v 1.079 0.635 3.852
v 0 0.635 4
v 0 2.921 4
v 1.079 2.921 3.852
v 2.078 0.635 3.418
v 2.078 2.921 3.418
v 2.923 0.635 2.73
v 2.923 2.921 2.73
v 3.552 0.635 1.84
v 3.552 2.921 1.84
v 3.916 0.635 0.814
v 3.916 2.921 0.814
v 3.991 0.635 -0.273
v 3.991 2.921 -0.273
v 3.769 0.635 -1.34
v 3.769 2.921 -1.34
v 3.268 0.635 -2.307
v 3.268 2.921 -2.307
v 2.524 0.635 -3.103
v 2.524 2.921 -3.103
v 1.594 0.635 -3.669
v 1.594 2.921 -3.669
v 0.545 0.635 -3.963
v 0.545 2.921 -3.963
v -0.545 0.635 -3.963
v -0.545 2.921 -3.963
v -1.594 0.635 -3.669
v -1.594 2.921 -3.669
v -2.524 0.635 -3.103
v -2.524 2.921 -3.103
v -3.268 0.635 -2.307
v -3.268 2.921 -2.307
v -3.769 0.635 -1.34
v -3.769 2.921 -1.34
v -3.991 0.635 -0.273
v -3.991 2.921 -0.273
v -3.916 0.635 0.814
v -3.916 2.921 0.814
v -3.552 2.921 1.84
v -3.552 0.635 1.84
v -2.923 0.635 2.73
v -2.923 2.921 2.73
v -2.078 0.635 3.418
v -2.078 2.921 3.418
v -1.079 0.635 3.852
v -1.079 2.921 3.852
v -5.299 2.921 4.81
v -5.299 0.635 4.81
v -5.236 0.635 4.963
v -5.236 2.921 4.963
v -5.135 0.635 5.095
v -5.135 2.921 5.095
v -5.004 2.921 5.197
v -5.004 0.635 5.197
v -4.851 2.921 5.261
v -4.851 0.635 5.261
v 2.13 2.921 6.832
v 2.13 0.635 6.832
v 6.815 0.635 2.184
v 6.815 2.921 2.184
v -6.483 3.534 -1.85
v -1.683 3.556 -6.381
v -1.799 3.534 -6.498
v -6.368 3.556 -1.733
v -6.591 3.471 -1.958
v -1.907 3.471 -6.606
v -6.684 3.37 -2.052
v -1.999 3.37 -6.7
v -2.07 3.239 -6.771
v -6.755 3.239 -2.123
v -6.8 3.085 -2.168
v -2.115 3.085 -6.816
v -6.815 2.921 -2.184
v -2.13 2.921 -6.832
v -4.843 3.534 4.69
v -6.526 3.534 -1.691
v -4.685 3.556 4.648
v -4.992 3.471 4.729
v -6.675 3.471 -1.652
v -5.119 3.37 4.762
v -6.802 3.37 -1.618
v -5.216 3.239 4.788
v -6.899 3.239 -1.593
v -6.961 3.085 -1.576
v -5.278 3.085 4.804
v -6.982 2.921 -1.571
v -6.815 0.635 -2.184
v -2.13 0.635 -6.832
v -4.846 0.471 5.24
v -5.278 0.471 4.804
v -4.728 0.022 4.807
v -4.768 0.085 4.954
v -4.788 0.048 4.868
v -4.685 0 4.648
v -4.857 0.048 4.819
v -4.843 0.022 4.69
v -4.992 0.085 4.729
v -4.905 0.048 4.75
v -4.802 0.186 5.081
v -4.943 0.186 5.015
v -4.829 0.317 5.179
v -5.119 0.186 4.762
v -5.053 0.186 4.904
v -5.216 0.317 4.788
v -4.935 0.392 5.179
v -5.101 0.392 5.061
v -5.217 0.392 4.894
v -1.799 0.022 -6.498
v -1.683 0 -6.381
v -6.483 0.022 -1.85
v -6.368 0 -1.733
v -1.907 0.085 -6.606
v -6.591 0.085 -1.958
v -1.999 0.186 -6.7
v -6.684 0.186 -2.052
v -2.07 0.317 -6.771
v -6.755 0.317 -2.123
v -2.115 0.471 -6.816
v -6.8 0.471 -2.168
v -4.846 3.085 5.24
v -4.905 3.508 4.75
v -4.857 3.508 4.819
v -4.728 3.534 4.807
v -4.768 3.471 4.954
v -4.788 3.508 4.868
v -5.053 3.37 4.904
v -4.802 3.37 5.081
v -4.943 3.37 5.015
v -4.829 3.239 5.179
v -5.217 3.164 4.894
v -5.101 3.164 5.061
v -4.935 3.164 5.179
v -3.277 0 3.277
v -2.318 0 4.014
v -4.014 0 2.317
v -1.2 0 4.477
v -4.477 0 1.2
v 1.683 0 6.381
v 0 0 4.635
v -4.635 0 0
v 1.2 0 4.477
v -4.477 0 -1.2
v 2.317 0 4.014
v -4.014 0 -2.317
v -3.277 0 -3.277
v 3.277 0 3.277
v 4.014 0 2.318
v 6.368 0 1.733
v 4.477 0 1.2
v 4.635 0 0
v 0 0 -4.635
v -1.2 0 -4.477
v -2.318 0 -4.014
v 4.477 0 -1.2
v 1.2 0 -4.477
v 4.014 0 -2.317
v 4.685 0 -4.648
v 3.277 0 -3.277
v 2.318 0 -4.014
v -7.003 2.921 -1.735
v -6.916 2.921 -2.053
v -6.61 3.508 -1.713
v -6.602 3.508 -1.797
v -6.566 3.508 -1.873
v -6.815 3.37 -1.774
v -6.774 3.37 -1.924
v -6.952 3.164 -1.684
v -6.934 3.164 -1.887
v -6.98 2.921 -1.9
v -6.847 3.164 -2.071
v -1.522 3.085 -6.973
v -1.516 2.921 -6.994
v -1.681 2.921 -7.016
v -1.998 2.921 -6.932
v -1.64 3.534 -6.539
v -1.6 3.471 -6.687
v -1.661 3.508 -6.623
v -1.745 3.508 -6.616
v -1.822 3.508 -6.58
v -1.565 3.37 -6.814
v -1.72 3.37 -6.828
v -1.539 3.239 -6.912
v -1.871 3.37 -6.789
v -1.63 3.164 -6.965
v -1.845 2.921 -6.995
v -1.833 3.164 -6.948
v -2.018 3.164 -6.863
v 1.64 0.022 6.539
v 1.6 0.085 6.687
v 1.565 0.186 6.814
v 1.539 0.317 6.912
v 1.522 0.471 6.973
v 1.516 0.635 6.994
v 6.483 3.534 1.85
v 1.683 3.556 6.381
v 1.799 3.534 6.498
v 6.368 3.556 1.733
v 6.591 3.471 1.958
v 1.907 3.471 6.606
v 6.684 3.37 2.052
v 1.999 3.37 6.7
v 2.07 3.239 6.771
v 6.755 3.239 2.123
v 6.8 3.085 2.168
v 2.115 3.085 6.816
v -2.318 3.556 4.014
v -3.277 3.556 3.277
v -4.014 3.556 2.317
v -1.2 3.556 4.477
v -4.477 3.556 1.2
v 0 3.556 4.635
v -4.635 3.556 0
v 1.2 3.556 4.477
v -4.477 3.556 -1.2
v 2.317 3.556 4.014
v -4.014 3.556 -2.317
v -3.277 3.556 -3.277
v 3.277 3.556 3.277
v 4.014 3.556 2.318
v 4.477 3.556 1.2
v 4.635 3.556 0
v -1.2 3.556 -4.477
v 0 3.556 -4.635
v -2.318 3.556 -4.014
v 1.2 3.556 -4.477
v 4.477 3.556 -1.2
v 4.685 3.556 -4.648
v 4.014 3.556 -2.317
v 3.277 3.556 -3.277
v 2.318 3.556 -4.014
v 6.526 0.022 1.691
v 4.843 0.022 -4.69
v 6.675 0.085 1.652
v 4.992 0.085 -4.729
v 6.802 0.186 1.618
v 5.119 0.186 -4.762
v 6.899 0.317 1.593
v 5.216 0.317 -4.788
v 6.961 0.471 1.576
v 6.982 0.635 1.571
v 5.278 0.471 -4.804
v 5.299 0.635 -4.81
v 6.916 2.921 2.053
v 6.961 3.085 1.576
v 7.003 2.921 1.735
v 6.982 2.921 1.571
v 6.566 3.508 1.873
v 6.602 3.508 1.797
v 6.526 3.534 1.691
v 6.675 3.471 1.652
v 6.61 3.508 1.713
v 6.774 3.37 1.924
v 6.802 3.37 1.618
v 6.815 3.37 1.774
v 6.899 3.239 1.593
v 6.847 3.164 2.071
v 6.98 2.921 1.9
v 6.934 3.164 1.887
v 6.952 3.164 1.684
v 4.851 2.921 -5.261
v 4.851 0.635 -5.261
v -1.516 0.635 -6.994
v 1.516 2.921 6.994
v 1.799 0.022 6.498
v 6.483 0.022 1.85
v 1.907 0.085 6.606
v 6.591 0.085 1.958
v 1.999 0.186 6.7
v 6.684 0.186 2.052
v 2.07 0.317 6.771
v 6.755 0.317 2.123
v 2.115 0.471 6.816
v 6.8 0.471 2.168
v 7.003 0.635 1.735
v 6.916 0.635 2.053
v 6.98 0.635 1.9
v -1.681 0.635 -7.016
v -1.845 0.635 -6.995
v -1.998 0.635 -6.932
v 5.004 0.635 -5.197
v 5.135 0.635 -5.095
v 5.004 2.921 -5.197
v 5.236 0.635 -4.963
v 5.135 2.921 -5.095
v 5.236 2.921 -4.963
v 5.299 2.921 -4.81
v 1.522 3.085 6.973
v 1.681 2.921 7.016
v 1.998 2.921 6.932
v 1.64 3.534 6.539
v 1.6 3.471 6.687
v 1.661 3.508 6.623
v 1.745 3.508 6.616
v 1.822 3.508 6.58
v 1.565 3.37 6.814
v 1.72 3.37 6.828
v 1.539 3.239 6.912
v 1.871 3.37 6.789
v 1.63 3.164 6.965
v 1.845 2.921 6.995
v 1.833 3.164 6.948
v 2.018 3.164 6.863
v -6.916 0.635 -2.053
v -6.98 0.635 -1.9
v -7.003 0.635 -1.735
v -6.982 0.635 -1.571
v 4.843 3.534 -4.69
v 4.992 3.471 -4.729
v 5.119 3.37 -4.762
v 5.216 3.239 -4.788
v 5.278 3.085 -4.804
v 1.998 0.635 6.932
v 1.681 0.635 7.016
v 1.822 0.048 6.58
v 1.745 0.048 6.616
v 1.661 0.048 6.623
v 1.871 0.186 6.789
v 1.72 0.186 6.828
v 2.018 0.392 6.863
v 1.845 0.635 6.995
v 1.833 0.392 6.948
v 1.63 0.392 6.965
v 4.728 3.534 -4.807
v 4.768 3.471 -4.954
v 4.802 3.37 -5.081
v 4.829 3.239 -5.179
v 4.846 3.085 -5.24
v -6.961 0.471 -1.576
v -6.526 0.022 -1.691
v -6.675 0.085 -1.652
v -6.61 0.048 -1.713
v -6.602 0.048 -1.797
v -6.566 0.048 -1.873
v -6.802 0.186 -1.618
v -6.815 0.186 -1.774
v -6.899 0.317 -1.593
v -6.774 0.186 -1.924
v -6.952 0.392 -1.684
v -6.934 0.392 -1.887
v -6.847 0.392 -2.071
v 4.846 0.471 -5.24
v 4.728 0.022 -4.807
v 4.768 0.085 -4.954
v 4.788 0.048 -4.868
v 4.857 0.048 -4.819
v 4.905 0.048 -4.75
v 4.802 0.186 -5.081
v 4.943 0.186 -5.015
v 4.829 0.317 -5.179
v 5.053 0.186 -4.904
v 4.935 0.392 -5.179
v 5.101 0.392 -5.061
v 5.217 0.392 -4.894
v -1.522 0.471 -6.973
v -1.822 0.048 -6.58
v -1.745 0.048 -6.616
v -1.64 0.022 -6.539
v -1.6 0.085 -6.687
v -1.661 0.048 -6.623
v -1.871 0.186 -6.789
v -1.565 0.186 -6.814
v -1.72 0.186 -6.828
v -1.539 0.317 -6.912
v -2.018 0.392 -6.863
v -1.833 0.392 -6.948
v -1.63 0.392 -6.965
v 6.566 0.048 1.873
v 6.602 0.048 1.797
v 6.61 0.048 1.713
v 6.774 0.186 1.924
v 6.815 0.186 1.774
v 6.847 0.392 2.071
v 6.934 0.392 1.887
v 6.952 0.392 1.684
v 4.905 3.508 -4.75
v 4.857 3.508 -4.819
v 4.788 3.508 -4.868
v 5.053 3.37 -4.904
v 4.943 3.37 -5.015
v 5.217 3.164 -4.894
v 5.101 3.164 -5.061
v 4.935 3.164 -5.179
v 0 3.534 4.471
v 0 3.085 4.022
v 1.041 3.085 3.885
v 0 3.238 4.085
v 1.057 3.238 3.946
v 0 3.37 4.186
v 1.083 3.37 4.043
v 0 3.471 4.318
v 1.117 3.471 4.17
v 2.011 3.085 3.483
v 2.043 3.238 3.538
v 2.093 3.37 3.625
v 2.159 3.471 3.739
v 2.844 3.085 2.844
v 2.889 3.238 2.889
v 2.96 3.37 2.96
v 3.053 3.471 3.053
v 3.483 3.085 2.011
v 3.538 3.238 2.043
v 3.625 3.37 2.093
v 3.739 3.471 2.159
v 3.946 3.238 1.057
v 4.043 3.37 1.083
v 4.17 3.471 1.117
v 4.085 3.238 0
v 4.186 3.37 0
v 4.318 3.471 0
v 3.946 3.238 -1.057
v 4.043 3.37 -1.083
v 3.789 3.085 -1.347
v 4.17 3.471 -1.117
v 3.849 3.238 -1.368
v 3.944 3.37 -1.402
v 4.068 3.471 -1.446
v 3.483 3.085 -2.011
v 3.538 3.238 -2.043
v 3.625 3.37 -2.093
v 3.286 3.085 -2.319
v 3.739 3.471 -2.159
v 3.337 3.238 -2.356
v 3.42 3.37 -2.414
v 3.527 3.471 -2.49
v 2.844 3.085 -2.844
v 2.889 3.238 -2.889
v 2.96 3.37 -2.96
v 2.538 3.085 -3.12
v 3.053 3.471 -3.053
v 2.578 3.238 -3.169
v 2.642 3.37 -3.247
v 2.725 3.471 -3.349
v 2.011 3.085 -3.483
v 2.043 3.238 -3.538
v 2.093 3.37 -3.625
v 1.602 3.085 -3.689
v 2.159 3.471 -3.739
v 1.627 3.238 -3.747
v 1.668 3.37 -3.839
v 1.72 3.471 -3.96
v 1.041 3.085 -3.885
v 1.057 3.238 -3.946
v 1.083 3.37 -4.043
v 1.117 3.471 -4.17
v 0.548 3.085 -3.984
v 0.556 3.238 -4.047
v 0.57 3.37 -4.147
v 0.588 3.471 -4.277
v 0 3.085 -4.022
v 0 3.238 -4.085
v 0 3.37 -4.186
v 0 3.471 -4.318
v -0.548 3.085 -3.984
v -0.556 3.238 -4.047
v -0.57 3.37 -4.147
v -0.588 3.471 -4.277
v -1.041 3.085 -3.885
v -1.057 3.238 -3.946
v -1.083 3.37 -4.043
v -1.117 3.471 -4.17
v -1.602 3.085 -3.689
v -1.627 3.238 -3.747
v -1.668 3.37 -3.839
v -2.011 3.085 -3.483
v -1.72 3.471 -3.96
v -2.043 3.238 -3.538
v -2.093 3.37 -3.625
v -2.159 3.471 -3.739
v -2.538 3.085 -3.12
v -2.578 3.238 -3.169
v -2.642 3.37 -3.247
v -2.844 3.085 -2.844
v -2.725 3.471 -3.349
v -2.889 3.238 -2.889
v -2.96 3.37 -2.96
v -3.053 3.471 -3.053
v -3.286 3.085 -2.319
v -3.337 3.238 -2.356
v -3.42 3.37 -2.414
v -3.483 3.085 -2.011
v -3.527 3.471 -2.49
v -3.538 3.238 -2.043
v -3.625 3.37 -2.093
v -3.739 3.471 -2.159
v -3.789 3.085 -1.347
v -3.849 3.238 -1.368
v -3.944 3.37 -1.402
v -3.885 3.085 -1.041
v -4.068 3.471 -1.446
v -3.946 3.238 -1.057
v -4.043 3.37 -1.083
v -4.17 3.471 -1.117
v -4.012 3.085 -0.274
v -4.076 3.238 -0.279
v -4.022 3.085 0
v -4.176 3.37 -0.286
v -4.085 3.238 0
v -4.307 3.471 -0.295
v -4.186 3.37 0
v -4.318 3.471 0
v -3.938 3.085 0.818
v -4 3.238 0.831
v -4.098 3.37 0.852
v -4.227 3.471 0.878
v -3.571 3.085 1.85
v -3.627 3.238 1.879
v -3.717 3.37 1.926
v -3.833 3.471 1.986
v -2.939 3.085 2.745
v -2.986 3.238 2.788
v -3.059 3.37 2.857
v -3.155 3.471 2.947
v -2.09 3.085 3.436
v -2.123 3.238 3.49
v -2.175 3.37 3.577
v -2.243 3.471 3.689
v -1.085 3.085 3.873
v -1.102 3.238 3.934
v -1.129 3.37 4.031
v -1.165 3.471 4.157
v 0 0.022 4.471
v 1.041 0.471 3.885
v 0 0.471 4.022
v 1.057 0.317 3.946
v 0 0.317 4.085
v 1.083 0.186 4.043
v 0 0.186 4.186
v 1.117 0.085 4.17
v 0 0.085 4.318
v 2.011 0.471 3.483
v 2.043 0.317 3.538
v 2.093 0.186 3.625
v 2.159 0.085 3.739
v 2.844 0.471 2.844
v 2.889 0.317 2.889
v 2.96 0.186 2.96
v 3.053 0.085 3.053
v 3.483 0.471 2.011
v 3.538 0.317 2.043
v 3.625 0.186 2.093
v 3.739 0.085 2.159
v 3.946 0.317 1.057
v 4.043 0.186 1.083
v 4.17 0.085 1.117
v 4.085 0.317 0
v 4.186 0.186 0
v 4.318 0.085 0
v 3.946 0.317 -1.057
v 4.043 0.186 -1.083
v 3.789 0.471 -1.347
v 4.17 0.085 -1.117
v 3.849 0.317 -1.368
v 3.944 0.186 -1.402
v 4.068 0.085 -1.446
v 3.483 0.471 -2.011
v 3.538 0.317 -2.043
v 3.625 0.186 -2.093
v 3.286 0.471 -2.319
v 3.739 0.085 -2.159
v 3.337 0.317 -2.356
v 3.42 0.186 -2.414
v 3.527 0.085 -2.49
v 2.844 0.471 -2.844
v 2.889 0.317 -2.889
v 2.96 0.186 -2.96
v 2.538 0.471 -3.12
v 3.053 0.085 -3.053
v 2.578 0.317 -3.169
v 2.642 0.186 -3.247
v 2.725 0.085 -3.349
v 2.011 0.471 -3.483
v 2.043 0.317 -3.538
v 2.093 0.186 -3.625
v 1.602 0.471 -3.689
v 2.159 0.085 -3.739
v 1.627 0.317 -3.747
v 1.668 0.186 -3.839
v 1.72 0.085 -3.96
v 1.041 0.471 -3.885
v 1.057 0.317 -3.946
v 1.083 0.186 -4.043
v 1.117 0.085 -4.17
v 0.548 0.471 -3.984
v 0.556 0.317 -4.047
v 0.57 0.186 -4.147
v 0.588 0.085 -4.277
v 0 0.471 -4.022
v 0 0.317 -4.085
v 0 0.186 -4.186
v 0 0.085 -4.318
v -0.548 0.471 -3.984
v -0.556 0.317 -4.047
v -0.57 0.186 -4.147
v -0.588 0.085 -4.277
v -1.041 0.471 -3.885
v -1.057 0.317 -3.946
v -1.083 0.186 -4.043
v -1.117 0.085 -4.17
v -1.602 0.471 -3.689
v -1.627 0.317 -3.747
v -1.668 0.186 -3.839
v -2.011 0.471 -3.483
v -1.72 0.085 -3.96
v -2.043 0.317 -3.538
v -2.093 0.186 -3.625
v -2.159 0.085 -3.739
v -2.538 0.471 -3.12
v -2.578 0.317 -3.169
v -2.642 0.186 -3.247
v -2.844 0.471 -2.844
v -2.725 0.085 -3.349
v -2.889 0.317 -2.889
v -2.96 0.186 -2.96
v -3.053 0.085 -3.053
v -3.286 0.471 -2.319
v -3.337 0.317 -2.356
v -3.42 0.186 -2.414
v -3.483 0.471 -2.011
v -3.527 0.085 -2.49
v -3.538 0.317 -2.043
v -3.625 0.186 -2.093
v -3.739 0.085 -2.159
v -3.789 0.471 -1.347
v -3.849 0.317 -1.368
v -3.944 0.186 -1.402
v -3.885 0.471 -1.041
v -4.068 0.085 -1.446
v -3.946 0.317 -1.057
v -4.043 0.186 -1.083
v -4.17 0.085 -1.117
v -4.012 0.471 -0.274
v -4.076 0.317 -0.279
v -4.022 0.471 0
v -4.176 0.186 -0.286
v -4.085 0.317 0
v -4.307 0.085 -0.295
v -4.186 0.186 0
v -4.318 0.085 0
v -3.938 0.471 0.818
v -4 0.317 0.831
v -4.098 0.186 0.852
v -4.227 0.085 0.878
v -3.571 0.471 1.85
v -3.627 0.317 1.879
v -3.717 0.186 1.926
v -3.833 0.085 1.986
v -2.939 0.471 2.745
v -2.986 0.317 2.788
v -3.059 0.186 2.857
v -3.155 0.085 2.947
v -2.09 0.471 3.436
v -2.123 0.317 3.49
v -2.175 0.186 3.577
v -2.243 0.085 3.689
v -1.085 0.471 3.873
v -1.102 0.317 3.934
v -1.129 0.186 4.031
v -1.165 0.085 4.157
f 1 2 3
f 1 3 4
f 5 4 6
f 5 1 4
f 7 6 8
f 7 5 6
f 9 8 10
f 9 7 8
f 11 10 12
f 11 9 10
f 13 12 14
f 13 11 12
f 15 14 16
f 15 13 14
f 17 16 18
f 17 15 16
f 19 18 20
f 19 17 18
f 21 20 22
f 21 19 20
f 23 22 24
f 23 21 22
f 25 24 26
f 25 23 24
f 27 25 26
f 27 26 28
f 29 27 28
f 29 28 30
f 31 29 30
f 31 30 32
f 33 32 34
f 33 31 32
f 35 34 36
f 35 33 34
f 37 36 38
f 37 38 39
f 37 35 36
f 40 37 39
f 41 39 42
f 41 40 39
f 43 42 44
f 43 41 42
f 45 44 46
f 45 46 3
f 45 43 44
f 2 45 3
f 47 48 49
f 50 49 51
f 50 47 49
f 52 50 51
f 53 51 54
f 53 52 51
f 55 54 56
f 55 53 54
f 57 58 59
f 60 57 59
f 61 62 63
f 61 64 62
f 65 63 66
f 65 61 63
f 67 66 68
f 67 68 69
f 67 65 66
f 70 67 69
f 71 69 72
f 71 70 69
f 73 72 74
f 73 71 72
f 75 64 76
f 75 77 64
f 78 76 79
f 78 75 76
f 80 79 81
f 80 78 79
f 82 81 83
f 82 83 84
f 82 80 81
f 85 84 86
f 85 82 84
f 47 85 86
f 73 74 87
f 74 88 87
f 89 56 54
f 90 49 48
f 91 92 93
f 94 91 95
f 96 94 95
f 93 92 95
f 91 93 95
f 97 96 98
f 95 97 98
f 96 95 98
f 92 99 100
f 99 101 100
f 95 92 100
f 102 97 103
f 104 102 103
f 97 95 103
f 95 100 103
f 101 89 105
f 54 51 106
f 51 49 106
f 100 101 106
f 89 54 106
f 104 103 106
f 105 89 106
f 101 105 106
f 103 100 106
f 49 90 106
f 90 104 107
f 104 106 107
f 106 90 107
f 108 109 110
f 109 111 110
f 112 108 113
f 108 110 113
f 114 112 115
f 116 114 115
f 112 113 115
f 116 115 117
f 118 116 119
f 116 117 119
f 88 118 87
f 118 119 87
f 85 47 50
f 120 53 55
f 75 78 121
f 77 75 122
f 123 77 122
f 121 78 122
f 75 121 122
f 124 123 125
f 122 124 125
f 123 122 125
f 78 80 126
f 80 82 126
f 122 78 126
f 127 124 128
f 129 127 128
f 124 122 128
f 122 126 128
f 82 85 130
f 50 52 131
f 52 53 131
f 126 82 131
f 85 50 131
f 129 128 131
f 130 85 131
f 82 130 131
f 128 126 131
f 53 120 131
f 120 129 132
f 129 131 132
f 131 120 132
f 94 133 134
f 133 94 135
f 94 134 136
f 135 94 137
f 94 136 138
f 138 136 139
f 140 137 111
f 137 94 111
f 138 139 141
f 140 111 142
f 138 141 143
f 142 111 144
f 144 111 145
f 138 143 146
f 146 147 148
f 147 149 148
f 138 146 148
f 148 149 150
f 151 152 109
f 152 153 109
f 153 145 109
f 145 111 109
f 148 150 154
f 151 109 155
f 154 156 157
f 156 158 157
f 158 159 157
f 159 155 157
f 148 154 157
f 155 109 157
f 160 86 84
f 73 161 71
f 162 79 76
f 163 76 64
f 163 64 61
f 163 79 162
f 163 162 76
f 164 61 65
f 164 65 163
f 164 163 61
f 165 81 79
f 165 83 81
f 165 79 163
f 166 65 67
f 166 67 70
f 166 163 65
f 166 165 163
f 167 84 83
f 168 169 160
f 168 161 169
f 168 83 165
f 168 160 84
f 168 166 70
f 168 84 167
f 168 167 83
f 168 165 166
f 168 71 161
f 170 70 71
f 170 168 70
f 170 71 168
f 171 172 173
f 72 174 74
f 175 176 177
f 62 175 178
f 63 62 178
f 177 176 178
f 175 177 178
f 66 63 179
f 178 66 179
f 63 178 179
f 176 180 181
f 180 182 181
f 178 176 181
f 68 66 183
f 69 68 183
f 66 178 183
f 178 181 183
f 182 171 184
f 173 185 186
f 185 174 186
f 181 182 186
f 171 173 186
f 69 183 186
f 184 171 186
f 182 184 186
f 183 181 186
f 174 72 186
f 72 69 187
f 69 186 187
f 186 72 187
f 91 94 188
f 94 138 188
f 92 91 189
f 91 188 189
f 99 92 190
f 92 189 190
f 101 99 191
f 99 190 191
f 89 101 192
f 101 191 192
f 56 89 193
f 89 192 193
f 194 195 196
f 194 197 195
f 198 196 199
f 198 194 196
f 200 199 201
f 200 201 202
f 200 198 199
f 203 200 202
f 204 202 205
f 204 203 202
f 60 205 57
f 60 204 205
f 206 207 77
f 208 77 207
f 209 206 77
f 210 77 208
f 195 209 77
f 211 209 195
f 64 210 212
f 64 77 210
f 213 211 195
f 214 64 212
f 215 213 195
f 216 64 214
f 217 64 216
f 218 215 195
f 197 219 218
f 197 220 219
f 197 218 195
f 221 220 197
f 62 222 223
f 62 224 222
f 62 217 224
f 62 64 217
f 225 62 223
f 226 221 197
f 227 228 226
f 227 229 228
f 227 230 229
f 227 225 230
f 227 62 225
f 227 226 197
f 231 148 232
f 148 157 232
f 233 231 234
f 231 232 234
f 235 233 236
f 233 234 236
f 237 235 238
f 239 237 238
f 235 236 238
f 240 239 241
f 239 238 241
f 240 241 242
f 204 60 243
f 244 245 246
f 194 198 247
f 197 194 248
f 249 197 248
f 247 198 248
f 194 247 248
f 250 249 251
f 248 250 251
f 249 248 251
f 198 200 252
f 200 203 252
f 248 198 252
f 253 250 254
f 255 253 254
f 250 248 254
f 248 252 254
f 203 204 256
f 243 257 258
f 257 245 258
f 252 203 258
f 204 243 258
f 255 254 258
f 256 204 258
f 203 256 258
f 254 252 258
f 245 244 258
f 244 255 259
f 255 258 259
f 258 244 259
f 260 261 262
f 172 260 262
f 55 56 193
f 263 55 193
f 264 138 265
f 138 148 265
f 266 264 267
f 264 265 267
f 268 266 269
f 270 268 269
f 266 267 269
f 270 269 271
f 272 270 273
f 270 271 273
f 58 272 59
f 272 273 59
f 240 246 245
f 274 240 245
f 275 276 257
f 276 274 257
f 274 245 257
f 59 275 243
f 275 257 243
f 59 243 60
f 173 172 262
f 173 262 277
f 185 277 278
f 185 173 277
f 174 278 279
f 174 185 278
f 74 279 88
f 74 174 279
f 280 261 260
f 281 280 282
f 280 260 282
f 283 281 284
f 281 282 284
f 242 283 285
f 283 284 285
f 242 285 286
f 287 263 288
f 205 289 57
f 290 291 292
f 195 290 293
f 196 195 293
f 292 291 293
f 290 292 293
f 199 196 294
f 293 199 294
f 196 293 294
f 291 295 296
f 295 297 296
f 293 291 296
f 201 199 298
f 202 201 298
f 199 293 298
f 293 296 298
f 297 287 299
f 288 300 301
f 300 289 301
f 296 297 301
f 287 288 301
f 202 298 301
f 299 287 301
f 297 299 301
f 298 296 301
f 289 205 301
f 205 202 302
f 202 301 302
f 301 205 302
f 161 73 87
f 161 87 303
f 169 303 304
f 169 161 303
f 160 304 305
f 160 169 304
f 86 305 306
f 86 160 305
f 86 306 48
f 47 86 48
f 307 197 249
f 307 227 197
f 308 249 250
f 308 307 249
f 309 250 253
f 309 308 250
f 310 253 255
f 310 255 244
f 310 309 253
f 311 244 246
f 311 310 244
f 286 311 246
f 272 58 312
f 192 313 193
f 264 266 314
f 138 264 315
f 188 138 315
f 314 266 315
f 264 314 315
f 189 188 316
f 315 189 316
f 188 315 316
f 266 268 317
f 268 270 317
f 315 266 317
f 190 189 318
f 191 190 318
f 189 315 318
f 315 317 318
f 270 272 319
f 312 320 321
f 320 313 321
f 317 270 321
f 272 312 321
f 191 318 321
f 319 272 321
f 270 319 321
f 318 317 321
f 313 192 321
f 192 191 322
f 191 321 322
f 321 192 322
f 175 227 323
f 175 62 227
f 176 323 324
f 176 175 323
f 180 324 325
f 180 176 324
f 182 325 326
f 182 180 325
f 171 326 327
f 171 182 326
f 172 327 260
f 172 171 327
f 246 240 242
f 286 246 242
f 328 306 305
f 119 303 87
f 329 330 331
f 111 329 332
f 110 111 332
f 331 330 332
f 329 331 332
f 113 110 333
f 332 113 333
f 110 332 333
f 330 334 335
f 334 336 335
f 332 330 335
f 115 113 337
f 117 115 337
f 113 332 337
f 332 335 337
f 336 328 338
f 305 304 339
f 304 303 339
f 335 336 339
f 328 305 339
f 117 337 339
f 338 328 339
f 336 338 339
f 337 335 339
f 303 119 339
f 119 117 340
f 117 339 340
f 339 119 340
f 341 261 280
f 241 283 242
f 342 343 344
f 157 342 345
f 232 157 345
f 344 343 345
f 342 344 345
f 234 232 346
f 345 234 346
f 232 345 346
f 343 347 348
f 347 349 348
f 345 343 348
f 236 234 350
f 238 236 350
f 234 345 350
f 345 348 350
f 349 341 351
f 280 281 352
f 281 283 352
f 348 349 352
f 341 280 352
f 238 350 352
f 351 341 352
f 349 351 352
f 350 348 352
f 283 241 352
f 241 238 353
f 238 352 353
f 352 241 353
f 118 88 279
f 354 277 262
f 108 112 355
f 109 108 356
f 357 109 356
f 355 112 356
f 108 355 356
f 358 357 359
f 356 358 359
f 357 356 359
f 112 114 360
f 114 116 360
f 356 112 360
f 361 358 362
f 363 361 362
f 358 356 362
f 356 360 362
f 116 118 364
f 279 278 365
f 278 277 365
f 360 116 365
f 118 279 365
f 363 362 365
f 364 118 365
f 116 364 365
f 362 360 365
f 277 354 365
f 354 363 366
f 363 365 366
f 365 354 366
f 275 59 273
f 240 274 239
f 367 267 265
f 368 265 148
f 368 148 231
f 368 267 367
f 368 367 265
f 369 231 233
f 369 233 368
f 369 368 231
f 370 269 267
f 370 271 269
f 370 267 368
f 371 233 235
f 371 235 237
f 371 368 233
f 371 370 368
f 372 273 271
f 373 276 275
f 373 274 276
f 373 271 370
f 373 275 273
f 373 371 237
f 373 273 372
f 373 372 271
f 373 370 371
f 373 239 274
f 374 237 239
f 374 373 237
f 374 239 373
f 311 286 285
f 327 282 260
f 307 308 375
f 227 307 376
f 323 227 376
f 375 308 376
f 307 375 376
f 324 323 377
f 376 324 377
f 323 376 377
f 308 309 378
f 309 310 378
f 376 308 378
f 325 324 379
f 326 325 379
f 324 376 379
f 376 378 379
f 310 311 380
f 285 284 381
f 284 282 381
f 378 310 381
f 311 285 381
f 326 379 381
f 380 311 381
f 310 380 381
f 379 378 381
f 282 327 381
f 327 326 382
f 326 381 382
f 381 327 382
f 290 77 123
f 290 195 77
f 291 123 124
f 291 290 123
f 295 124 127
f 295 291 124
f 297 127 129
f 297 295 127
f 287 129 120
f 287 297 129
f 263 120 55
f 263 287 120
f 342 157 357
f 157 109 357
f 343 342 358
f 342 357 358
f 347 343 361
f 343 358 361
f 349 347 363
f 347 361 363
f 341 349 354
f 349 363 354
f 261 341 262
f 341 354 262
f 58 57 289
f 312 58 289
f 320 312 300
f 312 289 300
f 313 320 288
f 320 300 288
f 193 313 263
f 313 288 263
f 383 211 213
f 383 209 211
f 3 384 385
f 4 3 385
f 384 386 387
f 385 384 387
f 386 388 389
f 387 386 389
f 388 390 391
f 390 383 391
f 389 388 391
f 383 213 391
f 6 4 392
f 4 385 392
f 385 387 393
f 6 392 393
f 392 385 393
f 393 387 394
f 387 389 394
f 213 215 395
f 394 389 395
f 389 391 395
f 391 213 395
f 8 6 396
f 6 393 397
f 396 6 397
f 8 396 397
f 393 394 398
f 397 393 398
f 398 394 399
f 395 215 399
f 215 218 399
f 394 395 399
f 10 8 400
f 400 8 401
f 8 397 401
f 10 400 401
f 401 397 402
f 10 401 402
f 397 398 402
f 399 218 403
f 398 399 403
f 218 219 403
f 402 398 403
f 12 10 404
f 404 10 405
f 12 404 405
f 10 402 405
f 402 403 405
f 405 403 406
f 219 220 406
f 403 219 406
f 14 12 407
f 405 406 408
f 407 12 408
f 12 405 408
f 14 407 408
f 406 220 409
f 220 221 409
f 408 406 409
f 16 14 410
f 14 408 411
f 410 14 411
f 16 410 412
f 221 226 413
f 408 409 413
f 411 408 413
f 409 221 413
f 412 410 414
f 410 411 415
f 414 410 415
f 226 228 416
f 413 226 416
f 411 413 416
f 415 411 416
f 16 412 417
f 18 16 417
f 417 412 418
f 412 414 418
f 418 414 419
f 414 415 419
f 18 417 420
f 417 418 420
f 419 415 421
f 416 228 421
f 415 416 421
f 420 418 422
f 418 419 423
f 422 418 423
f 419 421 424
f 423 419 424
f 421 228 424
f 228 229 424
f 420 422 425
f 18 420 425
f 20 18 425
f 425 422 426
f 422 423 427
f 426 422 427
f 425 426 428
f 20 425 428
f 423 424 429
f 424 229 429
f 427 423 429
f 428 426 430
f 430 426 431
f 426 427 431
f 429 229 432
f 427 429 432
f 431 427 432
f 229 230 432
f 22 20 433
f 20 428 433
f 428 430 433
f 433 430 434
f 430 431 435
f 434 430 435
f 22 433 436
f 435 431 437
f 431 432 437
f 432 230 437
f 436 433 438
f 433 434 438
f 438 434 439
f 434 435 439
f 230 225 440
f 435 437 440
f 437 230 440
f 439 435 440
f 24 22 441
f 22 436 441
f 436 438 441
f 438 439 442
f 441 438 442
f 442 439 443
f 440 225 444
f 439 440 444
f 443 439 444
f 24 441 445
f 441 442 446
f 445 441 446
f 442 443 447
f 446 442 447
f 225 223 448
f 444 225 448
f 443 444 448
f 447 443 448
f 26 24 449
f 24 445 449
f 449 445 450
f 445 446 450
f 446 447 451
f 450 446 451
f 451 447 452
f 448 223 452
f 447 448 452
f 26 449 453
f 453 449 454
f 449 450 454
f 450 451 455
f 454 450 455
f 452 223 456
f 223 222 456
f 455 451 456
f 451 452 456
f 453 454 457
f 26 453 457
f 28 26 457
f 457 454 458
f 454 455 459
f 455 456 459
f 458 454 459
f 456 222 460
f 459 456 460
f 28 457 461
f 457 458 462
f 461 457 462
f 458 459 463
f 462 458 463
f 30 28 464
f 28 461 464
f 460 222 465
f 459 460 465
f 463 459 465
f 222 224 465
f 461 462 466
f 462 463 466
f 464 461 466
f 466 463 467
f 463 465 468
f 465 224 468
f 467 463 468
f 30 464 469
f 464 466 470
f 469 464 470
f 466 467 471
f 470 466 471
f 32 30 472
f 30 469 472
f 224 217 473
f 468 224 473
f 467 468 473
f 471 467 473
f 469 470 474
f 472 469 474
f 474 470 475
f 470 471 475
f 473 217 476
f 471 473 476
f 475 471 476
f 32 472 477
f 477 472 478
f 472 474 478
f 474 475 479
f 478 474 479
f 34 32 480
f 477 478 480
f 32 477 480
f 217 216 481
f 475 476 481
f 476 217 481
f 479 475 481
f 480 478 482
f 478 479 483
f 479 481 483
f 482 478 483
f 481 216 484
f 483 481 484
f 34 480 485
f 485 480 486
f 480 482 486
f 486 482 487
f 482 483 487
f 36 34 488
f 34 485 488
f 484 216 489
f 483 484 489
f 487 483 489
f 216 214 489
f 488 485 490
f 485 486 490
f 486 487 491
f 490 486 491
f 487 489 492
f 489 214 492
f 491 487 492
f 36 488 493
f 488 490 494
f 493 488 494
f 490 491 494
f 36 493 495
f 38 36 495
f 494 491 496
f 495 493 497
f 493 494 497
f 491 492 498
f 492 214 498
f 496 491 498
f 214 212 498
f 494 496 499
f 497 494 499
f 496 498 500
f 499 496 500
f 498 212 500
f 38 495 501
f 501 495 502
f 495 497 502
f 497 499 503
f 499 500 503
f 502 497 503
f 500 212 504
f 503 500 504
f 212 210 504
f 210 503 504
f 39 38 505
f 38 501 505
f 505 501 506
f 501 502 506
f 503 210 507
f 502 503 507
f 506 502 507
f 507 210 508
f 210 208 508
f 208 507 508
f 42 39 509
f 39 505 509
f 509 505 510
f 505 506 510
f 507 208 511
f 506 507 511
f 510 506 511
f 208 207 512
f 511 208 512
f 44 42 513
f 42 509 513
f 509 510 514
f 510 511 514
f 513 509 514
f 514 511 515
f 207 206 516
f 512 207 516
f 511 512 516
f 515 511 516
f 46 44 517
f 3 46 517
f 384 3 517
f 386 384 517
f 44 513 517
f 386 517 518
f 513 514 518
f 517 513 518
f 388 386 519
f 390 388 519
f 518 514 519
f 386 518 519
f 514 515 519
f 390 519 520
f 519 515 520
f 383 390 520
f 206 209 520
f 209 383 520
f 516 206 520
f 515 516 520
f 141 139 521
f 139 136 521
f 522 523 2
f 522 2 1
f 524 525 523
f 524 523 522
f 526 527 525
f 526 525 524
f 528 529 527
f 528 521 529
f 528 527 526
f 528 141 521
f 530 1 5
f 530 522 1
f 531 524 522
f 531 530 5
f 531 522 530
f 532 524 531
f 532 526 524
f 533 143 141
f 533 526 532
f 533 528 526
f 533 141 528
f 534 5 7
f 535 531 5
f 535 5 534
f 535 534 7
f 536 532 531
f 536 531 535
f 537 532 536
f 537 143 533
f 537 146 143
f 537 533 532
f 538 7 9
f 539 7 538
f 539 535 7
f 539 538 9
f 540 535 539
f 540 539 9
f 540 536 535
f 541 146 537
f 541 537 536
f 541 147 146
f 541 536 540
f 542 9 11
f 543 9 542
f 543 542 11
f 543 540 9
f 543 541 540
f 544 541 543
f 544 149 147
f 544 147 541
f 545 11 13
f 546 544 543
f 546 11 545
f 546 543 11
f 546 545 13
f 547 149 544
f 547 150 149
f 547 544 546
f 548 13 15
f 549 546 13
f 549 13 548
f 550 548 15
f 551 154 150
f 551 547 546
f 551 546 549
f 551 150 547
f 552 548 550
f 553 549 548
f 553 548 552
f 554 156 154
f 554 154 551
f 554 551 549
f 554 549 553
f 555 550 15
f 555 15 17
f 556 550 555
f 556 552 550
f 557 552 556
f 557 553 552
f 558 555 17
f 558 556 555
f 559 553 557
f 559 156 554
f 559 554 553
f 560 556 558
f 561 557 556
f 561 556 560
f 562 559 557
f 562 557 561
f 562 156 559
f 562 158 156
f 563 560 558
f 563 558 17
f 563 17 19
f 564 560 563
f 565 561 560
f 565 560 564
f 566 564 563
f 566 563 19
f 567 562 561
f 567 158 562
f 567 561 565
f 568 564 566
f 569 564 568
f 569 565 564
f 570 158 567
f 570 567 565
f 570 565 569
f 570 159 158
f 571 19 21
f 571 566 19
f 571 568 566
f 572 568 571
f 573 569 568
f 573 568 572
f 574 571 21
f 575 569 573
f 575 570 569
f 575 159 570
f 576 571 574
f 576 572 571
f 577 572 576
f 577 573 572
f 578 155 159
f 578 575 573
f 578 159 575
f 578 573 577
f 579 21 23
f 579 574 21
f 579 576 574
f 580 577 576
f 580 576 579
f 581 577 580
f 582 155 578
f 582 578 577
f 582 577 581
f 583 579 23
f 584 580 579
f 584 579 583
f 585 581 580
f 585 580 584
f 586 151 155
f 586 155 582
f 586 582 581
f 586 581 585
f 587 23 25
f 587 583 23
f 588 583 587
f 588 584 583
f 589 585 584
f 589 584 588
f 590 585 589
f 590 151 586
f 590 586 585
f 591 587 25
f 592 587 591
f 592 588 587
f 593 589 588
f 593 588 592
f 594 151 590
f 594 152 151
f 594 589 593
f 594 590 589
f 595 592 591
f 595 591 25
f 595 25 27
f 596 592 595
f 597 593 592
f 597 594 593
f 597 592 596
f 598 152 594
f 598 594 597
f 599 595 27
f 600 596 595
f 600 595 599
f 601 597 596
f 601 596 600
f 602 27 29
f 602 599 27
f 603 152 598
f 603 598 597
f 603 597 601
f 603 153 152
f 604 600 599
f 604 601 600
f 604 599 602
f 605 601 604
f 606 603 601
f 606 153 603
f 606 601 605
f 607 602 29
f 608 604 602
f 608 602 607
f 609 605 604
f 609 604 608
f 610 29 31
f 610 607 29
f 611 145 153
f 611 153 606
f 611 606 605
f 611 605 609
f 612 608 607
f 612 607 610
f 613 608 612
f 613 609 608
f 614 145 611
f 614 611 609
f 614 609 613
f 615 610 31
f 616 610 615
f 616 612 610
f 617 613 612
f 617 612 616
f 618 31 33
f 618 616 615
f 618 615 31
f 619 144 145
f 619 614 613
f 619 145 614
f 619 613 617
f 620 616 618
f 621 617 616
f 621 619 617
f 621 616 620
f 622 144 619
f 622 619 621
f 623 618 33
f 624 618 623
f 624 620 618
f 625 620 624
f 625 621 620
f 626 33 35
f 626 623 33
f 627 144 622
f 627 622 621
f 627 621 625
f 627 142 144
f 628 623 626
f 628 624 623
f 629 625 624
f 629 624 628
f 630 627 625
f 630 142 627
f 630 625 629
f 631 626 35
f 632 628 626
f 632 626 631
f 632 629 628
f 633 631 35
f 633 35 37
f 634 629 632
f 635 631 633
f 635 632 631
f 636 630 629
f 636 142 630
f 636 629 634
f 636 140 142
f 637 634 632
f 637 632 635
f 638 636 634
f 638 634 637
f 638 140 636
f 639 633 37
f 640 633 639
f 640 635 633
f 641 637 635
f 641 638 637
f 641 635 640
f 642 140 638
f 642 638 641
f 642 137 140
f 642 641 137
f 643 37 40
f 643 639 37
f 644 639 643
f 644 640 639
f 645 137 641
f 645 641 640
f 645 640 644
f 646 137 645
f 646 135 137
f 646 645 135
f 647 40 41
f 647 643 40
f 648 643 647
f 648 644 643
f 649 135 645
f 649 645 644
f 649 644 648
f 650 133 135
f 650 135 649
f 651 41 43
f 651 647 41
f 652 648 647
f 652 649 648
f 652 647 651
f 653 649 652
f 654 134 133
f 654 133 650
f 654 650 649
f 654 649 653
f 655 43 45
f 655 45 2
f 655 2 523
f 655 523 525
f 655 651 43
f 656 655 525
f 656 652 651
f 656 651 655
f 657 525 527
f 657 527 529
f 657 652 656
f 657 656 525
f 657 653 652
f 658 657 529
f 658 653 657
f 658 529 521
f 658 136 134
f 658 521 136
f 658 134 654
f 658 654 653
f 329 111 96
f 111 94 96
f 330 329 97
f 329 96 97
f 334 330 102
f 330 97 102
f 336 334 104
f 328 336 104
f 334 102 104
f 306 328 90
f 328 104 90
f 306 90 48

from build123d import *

# Parameters (mm, degrees)
SKETCH1_R           = 4
BOSS_EXTRUDE1_DEPTH = 3.556
FILLET1_R           = 0.635
FILLET2_R           = 0.635


with BuildPart() as part:
    # Sketch1 → Boss-Extrude1 (new body)
    with BuildSketch(Plane(origin=(0, 0, 0), x_dir=(1, 0, 0), z_dir=(0, 1, 0))):
        Polygon((5.205006366, 5.164420787), (-1.870016414, 7.089878133), (-7.07502278, 1.925457346), (-5.205006366, -5.164420787), (1.870016414, -7.089878133), (7.07502278, -1.925457346), align=None)
        with Locations(Location((0, 0, 0), (0, 0, 270))):
            Circle(SKETCH1_R, mode=Mode.SUBTRACT)
    extrude(amount=BOSS_EXTRUDE1_DEPTH)

    # Fillet1
    fillet1_edges = [part.edges().sort_by_distance(p)[0] for p in [
        (0, 0, -4),
        (0, 3.556, -4),
    ]]
    fillet(fillet1_edges, radius=FILLET1_R)

    # Fillet2
    fillet2_edges = [part.edges().sort_by_distance(p)[0] for p in [
        (-4.472519597, 3.556, -4.50766774),
        (7.07502278, 1.778, 1.925457346),
        (1.870016414, 1.778, 7.089878133),
        (-5.205006366, 1.778, 5.164420787),
        (-7.07502278, 1.778, -1.925457346),
        (-1.870016414, 1.778, -7.089878133),
        (5.205006366, 1.778, -5.164420787),
        (-6.140014573, 3.556, 1.61948172),
        (-1.667494976, 3.556, 6.12714946),
        (4.472519597, 3.556, 4.50766774),
        (6.140014573, 3.556, -1.61948172),
        (4.472519597, 0, 4.50766774),
        (-1.667494976, 0, 6.12714946),
        (-6.140014573, 0, 1.61948172),
        (1.667494976, 3.556, -6.12714946),
        (-4.472519597, 0, -4.50766774),
        (1.667494976, 0, -6.12714946),
        (6.140014573, 0, -1.61948172),
    ]]
    fillet(fillet2_edges, radius=FILLET2_R)


solid = part.part
